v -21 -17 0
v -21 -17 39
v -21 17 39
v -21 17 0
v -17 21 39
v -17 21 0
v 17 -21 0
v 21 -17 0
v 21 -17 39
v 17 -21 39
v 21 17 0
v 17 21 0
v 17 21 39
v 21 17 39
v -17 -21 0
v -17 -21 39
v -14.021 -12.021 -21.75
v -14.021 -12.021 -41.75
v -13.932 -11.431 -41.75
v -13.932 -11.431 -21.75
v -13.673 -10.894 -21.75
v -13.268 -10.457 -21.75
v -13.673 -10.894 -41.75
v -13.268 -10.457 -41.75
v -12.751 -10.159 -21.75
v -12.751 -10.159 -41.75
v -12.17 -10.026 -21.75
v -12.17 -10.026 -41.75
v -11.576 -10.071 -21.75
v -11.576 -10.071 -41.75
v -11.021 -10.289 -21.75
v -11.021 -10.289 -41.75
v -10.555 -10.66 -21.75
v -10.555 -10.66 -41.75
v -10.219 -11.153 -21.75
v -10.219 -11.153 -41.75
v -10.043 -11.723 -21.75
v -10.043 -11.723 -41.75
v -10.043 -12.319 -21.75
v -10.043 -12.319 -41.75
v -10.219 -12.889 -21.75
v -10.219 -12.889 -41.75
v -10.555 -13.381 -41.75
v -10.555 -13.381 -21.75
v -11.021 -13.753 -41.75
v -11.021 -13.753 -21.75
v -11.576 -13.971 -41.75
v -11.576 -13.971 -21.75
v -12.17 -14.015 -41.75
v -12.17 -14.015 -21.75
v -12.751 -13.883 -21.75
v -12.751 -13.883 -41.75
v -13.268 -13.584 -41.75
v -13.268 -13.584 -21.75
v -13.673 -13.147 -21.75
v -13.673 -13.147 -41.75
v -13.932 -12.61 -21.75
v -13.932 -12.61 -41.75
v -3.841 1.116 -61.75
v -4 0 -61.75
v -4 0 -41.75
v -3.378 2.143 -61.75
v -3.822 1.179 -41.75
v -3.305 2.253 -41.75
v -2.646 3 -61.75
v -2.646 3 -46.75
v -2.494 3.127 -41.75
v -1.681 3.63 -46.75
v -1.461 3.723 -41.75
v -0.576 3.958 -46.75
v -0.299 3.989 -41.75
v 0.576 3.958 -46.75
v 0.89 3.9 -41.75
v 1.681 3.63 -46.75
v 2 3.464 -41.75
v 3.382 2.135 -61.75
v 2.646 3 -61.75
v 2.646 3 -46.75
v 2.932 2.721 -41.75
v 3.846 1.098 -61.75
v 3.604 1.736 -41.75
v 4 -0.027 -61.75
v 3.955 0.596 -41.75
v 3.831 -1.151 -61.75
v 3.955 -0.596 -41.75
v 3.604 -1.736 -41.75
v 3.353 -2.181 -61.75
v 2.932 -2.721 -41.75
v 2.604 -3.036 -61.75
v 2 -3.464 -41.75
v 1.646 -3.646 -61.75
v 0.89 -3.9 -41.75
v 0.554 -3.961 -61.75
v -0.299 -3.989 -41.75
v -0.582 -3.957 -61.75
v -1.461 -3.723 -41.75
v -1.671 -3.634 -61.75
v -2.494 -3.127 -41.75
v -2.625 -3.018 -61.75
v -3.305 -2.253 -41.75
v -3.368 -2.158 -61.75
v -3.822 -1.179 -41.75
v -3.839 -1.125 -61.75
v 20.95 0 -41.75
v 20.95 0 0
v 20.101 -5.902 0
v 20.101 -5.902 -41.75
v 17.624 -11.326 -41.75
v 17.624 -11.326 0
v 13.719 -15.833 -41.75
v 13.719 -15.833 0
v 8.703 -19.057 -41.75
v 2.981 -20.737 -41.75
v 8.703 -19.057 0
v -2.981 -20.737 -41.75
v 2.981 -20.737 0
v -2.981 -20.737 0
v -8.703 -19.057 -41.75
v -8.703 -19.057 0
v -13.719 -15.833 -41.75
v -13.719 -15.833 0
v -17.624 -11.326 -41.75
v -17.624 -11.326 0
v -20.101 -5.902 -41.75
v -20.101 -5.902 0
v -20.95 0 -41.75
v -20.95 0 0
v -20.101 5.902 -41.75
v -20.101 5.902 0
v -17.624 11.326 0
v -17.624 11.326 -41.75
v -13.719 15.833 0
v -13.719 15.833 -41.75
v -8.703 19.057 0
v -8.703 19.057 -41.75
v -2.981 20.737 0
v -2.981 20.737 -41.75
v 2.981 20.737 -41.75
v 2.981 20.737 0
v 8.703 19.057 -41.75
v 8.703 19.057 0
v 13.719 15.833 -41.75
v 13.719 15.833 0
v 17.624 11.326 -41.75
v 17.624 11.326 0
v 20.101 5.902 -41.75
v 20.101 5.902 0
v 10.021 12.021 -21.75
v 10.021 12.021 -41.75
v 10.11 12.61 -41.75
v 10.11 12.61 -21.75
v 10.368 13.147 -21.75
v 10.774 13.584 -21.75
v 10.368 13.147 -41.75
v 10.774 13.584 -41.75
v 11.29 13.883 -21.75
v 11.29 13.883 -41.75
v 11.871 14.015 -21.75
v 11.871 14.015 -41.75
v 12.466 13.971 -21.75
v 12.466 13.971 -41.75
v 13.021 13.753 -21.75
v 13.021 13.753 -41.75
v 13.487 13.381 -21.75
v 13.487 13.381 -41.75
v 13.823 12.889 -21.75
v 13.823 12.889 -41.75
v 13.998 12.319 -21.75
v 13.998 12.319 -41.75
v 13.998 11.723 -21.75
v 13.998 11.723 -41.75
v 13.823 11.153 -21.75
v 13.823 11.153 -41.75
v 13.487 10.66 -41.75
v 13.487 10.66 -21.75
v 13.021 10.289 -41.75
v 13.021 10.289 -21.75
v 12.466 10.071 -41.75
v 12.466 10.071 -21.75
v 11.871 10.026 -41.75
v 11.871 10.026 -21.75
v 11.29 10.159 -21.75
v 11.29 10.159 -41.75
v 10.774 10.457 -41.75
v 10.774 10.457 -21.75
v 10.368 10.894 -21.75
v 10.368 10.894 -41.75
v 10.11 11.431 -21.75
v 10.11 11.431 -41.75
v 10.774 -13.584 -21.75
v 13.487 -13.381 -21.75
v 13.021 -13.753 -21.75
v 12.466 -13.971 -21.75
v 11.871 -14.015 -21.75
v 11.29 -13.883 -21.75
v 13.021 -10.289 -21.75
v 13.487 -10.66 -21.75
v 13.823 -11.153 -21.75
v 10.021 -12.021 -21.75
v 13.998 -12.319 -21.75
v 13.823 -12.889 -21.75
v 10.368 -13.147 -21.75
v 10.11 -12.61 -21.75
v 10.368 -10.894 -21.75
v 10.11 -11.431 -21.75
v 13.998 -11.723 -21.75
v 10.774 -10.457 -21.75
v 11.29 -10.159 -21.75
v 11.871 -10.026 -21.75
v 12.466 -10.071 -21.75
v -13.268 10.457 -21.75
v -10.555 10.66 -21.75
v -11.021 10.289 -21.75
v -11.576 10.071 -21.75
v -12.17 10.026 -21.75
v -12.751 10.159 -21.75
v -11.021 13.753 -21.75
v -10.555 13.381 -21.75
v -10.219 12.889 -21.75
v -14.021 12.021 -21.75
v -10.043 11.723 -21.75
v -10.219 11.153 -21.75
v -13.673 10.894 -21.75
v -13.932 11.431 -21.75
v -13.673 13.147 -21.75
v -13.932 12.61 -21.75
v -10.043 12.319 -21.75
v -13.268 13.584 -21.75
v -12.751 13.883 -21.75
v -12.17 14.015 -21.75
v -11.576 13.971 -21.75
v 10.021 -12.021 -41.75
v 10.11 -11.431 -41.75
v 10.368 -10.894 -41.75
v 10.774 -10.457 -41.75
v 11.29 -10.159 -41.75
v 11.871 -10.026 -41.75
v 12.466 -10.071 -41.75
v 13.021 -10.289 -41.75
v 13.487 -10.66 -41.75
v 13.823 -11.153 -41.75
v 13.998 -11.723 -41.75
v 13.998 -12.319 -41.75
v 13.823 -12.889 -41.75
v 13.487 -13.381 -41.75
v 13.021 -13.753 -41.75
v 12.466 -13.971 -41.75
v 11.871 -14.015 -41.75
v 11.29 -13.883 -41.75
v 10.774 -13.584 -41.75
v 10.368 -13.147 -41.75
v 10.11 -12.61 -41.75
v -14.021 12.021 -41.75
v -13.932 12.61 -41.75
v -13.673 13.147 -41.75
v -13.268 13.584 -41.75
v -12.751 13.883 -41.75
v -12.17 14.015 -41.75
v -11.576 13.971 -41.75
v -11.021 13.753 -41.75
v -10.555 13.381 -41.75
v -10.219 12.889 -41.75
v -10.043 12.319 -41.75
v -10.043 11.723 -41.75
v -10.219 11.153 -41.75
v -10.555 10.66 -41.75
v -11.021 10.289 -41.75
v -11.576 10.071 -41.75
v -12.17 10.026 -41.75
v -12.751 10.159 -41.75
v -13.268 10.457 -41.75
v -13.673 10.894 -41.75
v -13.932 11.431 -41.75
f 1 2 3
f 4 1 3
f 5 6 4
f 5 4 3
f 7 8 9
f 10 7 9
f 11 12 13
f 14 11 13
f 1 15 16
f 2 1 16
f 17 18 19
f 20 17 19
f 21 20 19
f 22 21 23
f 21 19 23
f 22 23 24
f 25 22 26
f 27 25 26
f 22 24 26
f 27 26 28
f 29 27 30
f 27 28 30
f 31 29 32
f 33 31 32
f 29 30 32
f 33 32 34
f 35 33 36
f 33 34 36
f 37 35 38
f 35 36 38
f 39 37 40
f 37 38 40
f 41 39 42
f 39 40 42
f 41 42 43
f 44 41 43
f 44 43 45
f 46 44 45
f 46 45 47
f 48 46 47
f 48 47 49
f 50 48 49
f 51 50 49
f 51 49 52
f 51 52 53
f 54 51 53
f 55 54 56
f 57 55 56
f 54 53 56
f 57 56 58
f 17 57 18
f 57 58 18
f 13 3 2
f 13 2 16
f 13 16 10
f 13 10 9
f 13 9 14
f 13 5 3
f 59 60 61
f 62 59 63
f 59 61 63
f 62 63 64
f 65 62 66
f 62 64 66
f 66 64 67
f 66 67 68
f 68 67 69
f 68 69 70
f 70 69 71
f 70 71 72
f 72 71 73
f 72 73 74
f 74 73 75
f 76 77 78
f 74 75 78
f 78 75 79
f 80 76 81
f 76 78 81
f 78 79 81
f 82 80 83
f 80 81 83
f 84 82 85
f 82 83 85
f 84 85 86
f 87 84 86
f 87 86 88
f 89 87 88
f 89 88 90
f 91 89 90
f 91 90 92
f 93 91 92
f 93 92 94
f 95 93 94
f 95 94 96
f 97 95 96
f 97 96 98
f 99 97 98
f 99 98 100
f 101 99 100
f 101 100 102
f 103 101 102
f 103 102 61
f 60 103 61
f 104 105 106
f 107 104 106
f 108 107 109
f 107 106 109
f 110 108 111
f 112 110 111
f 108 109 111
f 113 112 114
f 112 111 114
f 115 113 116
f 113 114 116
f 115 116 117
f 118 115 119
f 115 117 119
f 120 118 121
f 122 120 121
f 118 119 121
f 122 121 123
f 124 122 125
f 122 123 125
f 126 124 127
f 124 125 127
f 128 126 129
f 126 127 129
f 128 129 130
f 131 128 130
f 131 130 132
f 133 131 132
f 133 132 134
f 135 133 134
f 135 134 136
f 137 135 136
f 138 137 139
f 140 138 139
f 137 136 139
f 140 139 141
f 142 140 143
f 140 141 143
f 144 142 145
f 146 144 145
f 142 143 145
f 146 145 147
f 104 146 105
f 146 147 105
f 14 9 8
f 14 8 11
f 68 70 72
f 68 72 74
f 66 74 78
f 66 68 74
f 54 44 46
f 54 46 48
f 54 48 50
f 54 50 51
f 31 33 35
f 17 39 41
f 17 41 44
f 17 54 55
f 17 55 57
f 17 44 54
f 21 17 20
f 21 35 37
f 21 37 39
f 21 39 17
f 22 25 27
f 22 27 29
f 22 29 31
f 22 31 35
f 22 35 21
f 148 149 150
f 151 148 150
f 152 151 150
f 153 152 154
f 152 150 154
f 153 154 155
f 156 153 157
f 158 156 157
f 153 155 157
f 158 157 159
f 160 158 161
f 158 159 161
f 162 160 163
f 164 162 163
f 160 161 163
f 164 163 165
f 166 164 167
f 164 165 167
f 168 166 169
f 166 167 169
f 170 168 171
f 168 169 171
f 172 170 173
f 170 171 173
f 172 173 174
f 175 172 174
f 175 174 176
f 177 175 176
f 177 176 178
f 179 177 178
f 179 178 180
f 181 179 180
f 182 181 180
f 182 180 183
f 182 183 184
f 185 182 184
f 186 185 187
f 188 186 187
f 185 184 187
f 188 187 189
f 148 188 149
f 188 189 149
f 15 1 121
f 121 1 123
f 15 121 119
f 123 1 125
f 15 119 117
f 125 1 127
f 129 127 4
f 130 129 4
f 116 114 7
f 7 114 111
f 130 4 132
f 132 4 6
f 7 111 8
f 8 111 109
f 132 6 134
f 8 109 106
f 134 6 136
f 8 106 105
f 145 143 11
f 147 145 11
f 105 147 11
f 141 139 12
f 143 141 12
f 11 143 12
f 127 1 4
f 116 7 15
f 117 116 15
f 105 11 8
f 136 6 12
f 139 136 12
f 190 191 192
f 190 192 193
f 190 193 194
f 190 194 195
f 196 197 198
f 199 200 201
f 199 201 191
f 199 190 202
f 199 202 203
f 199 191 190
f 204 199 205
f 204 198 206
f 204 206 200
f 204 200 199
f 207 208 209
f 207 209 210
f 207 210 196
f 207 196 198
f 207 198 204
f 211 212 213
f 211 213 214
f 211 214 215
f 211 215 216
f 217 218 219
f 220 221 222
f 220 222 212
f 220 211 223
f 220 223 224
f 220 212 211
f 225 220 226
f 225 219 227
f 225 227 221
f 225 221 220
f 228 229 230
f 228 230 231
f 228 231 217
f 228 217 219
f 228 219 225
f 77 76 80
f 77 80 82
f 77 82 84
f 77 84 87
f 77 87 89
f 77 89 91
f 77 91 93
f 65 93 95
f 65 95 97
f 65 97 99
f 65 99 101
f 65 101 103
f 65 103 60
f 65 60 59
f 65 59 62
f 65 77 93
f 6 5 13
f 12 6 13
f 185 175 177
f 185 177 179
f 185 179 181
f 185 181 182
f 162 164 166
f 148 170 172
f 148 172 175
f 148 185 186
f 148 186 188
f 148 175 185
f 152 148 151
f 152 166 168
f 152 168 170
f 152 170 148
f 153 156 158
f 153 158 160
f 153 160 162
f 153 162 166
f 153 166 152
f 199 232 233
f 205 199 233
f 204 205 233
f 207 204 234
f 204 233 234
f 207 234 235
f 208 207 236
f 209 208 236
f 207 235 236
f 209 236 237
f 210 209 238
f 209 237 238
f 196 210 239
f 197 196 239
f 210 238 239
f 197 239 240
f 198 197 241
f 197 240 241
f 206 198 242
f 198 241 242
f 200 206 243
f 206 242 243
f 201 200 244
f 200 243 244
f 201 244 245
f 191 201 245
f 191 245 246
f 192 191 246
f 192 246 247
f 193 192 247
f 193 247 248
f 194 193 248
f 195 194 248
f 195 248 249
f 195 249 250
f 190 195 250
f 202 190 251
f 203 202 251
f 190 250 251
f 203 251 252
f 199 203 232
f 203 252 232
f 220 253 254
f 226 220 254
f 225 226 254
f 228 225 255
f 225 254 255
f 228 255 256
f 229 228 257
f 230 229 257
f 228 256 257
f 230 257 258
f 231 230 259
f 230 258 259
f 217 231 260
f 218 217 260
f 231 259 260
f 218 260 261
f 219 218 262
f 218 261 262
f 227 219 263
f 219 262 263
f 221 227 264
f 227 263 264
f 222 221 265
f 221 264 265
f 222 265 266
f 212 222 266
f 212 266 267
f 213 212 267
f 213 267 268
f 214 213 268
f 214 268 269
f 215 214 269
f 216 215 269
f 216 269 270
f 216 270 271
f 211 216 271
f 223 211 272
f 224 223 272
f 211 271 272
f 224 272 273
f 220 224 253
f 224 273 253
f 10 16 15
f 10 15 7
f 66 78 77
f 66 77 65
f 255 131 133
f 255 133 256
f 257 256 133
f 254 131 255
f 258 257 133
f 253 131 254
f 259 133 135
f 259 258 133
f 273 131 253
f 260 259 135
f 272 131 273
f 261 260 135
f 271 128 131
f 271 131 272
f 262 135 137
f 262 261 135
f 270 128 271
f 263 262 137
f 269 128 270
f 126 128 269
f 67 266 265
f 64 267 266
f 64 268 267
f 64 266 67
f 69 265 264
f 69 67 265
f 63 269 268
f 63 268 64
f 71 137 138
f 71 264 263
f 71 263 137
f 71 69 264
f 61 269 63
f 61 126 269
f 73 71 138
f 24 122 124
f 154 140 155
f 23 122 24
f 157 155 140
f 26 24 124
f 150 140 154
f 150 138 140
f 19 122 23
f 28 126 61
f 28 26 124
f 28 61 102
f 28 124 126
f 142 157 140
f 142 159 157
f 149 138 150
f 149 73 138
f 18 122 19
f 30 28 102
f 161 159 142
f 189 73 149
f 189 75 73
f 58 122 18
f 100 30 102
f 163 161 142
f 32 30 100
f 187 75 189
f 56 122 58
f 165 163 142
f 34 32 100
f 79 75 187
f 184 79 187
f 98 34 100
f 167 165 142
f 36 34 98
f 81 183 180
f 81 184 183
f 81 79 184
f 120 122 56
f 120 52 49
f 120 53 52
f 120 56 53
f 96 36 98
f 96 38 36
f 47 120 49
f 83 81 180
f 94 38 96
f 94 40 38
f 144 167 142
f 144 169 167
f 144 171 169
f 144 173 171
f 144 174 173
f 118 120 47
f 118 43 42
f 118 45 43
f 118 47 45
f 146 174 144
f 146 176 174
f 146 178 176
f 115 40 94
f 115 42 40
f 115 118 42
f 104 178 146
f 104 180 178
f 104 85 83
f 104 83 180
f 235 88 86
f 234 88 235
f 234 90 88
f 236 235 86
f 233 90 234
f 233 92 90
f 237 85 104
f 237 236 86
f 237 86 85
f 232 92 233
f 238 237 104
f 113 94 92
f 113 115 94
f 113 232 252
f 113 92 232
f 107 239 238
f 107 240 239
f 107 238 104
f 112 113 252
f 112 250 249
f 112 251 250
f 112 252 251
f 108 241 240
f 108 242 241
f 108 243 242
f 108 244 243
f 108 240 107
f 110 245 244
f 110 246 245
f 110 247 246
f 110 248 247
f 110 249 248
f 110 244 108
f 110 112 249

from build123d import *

# Parameters (mm, degrees)
SKETCH1_W           = 42
SKETCH1_H           = 42
BOSS_EXTRUDE1_DEPTH = 39
CHAMFER1_SIZE       = 4
SKETCH2_R           = 20.95
BOSS_EXTRUDE2_DEPTH = 41.75
SKETCH3_R           = 4
BOSS_EXTRUDE3_DEPTH = 20
CUT_EXTRUDE1_START  = -15
CUT_EXTRUDE1_DEPTH  = 15
SKETCH5_R           = 2
CUT_EXTRUDE2_DEPTH  = 20


with BuildPart() as part:
    # Sketch1 → Boss-Extrude1 (new body)
    with BuildSketch(Plane.XY):
        Rectangle(SKETCH1_W, SKETCH1_H)
    extrude(amount=BOSS_EXTRUDE1_DEPTH)

    # Chamfer1
    chamfer1_edges = [part.edges().sort_by_distance(p)[0] for p in [
        (21, -21, 19.5),
        (-21, -21, 19.5),
        (-21, 21, 19.5),
        (21, 21, 19.5),
    ]]
    chamfer(chamfer1_edges, length=CHAMFER1_SIZE)

    # Sketch2 → Boss-Extrude2 (add)
    with BuildSketch(Plane(origin=(0, 0, 0), x_dir=(-1, 0, 0), z_dir=(0, 0, -1))):
        with Locations(Location((0, 0, 0), (0, 0, 180))):
            Circle(SKETCH2_R)
    extrude(amount=BOSS_EXTRUDE2_DEPTH)

    # Sketch3 → Boss-Extrude3 (add)
    with BuildSketch(Plane(origin=(0, 0, -41.75), x_dir=(-1, 0, 0), z_dir=(0, 0, -1))):
        Circle(SKETCH3_R)
    extrude(amount=BOSS_EXTRUDE3_DEPTH)

    # Sketch4 → Cut-Extrude1 (cut)
    with BuildSketch(Plane(origin=(0, 0, -61.75), x_dir=(-1, 0, 0), z_dir=(0, 0, -1)).offset(CUT_EXTRUDE1_START)):
        with BuildLine():
            Line((-2.645751311, 3), (2.645751311, 3))
            ThreePointArc((2.645751311, 3), (0, 4), (-2.645751311, 3))
        make_face()
    extrude(amount=CUT_EXTRUDE1_DEPTH, mode=Mode.SUBTRACT)

    # Sketch5 → Cut-Extrude2 (cut)
    with BuildSketch(Plane(origin=(0, 0, -41.75), x_dir=(-1, 0, 0), z_dir=(0, 0, -1))):
        with Locations((12.02081528, 12.02081528)):
            Circle(SKETCH5_R)
        with Locations((12.02081528, -12.02081528)):
            Circle(SKETCH5_R)
        with Locations((-12.02081528, -12.02081528)):
            Circle(SKETCH5_R)
        with Locations((-12.02081528, 12.02081528)):
            Circle(SKETCH5_R)
    extrude(amount=-CUT_EXTRUDE2_DEPTH, mode=Mode.SUBTRACT)


solid = part.part
